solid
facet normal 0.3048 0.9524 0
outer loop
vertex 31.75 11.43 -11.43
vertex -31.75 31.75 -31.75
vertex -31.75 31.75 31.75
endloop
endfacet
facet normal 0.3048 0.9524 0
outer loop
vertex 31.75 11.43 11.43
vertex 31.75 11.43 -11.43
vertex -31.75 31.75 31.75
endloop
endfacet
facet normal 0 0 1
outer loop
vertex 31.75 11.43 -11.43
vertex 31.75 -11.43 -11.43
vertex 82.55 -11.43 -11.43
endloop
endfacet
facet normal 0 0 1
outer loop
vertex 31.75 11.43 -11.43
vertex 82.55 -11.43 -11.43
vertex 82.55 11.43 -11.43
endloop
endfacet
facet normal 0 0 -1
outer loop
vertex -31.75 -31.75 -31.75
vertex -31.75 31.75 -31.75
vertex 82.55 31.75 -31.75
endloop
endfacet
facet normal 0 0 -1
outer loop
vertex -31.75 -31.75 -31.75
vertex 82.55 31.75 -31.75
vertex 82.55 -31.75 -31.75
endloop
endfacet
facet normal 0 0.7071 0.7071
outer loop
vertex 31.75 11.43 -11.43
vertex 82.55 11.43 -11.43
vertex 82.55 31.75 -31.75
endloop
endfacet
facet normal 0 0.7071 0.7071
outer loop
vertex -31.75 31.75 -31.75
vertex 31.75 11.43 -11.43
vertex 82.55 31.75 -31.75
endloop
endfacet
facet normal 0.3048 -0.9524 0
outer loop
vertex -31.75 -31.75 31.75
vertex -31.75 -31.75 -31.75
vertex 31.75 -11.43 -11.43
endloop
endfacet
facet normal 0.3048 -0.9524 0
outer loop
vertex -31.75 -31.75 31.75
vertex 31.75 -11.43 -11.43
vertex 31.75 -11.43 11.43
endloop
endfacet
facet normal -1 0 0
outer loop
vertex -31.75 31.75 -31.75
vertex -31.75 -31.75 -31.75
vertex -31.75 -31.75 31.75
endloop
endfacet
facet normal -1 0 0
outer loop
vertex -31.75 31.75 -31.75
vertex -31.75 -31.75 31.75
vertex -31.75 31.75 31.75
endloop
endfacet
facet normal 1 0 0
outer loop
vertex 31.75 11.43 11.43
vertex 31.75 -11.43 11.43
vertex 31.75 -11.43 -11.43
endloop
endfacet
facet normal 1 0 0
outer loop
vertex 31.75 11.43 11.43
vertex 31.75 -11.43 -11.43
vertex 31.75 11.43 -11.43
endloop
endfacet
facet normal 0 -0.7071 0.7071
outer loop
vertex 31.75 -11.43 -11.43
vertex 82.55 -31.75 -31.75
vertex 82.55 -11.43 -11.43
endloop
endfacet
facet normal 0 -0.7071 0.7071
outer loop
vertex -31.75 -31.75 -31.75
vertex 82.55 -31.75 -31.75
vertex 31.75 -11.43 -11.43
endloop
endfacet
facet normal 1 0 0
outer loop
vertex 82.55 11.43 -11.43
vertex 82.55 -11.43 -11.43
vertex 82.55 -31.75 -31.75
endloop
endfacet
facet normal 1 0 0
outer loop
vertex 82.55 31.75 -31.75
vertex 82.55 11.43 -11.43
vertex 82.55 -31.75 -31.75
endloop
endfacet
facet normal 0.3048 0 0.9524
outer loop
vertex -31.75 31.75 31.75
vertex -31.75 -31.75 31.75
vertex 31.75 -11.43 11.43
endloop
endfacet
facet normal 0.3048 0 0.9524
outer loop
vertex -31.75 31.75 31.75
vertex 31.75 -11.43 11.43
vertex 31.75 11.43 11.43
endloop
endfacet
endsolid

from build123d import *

# Parameters (mm, degrees)
F0_W     = 63.5
F0_H     = 63.5
F1_DEPTH = 31.75
F2_SIZE2 = 63.49999
F2_SIZE  = 20.31999
F4_DEPTH = 114.3


# Not quite as in the source:
# - a fillet or chamfer is up to 0.001 mm smaller than in the source, because OpenCascade refuses the exact size


with BuildPart() as f1:
    # F0 (on Right) → F1 (new body, symmetric)
    with BuildSketch(Plane.YZ):
        Rectangle(F0_W, F0_H)
    extrude(amount=F1_DEPTH, both=True)

    # F2 (size 20.32 and 63.5 in the source; OpenCascade refuses exactly that, so slightly less here)
    f2_edges = [f1.edges().sort_by_distance(p)[0] for p in [
        (31.75, -31.75, 0),
        (31.75, 0, 31.75),
        (31.75, 31.75, 0),
        (31.75, 0, -31.75),
    ]]
    f2_side = f1.faces().sort_by_distance((31.75, 0, 0))[0]
    chamfer(f2_edges, length=F2_SIZE, length2=F2_SIZE2, reference=f2_side)

    # F3 (on face) → F4 (join)
    with BuildSketch(Plane(origin=(-31.75, 0, 0), x_dir=(0, -1, 0), z_dir=(-1, 0, 0))):
        Polygon((-31.75, -31.75), (31.75, -31.75), (11.43, -11.43), (-11.43, -11.43), align=None)
    extrude(amount=-F4_DEPTH)


solid = f1.part
